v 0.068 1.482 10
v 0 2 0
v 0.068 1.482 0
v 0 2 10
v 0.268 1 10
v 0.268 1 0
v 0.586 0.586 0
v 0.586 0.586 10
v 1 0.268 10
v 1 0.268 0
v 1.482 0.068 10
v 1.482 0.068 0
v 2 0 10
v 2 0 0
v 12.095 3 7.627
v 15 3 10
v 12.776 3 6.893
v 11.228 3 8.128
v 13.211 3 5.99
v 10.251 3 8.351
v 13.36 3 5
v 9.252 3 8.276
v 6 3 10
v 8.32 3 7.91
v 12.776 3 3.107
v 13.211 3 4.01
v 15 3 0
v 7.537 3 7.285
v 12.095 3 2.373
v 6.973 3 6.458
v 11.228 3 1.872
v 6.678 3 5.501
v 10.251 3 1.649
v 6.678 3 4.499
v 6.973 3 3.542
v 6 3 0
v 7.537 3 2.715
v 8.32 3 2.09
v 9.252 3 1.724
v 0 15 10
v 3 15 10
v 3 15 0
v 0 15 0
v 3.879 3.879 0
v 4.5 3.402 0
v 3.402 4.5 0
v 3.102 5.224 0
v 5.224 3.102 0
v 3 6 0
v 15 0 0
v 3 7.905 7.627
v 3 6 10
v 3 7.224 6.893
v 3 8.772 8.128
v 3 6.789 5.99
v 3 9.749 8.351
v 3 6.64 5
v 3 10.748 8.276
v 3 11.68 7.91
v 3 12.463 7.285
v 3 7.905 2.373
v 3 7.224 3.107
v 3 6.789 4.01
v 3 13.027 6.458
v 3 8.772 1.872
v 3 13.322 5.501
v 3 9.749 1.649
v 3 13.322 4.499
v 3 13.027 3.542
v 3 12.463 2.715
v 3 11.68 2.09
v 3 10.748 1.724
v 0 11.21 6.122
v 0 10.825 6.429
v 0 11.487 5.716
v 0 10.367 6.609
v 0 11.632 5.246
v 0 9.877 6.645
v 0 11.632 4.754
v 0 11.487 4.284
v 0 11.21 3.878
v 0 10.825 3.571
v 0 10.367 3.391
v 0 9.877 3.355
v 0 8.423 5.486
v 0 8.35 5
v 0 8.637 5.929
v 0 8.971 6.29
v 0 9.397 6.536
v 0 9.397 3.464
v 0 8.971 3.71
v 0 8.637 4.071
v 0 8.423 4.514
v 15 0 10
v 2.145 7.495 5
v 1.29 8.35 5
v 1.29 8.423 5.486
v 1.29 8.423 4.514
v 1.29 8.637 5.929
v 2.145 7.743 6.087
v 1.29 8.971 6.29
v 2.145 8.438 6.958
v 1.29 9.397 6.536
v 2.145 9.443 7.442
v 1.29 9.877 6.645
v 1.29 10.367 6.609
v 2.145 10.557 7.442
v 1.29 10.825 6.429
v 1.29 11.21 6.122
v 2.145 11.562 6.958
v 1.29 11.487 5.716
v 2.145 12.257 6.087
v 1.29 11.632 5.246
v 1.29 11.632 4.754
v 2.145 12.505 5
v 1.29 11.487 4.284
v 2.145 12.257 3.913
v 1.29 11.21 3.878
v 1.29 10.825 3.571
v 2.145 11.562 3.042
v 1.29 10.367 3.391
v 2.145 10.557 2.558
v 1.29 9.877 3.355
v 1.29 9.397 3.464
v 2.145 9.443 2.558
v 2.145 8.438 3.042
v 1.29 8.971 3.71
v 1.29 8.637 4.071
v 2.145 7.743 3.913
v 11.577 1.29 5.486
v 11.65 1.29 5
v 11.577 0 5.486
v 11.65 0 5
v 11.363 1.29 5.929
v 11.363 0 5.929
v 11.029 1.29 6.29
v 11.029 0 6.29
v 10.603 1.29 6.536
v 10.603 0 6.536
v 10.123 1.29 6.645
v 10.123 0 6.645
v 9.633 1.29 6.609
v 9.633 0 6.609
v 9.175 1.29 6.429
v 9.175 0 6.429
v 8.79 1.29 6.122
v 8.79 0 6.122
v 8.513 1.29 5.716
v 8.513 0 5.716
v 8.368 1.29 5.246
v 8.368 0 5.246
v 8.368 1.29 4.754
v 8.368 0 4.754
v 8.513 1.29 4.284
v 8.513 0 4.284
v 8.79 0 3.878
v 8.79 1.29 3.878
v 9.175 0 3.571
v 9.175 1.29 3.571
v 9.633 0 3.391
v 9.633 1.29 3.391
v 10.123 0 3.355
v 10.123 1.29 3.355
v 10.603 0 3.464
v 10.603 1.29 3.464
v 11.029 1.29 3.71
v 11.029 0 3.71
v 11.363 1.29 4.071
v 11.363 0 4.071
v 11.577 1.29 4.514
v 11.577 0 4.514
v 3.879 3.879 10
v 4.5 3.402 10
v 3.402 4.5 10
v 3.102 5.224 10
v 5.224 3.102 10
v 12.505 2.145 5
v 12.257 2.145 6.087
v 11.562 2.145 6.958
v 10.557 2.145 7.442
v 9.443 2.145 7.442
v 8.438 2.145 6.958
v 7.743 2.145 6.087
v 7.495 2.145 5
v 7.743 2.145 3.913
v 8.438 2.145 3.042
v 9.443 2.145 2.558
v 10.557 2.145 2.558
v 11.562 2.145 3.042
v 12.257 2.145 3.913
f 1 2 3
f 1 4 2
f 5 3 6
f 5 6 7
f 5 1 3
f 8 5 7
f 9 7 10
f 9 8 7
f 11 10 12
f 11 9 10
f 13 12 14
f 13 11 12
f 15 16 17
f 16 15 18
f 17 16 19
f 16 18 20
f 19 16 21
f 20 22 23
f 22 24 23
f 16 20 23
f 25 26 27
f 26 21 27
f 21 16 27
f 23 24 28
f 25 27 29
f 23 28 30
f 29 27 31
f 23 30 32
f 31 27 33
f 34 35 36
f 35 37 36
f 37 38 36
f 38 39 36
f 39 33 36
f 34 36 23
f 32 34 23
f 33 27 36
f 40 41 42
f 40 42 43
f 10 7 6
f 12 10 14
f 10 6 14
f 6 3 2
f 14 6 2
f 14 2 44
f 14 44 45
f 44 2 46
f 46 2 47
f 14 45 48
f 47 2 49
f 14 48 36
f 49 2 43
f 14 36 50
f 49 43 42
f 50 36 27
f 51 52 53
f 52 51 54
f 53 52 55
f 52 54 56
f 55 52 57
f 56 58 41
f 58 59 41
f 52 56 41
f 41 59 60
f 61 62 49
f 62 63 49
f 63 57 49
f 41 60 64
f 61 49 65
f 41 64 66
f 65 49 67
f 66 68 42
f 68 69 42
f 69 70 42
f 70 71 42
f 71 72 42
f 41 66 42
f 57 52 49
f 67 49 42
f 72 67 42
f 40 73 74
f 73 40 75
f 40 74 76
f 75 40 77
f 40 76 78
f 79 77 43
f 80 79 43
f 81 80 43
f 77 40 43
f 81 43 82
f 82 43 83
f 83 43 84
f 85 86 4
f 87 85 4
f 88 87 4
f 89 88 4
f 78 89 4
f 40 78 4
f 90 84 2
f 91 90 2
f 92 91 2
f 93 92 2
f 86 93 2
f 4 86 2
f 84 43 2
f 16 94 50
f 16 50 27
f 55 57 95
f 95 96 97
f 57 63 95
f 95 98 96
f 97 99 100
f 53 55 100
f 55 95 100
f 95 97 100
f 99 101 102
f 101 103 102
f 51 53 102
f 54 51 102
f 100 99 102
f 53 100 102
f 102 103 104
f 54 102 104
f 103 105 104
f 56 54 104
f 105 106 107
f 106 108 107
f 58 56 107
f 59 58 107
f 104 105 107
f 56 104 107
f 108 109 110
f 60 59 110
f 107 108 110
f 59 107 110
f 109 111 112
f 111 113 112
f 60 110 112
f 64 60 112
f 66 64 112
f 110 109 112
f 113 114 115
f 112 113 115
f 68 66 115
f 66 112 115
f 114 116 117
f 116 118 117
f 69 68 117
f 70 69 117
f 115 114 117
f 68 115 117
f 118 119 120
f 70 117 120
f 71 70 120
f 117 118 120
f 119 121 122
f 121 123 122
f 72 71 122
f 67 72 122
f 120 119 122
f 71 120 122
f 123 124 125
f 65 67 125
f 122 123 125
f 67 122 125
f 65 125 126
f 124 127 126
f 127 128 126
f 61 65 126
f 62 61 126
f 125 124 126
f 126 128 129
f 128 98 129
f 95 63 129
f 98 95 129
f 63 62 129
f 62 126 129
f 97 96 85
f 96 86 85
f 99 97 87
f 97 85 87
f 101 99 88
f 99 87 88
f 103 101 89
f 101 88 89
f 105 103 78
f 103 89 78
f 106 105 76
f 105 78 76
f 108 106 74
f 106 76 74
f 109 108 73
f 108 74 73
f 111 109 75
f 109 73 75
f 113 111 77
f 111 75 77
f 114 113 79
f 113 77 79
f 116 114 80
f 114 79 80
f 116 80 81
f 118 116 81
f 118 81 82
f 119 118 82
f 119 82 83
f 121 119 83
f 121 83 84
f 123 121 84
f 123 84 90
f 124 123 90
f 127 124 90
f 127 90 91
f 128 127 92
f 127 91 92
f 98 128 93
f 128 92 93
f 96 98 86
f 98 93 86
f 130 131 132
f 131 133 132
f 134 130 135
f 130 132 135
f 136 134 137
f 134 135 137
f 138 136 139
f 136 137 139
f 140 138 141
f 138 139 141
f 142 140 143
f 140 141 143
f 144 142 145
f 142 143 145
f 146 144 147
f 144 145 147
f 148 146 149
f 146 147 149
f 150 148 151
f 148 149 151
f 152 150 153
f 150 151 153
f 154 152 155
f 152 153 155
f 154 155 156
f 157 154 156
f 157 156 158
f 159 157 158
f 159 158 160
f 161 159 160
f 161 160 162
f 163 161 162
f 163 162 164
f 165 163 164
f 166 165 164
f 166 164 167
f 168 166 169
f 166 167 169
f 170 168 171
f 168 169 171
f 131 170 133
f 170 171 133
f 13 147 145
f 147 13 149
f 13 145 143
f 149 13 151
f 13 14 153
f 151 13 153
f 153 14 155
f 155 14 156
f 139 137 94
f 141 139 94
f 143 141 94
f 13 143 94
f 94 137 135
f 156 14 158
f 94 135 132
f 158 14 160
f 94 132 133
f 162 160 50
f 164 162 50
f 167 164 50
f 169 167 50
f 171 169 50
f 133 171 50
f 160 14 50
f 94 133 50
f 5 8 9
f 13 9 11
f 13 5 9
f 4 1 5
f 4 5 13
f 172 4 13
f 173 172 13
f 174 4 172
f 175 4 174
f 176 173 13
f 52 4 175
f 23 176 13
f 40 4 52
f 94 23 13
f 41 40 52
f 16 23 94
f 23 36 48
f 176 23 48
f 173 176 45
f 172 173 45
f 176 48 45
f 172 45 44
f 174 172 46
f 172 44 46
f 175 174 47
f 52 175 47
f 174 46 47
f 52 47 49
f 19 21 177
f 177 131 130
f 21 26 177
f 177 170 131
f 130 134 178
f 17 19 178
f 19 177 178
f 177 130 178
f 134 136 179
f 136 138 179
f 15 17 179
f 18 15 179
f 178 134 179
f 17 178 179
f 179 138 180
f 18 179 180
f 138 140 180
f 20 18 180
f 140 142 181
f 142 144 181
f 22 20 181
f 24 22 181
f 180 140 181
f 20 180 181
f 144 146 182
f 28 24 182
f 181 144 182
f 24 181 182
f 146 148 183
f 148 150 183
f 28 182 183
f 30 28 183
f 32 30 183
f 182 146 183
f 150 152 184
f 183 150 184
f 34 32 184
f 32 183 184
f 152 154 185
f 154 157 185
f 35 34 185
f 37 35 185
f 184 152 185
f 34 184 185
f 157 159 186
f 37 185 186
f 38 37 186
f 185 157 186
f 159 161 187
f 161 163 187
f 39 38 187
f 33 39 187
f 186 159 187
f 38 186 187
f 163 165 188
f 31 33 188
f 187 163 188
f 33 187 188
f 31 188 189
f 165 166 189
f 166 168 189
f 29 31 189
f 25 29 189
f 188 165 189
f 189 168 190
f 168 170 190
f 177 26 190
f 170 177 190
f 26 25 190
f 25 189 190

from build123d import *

# Parameters (mm, degrees)
F1_DEPTH       = 10
F3_D           = 3.3
F3_CSINK_D     = 6.72
F3_CSINK_ANGLE = 90
F5_D           = 3.3
F5_CSINK_D     = 6.72
F5_CSINK_ANGLE = 90
F6_R           = 2


with BuildPart() as f1:
    # F0 (on Top) → F1 (new body)
    with BuildSketch(Plane.XY):
        with BuildLine():
            Line((0, 15), (0, 0))
            Line((0, 0), (15, 0))
            Line((15, 0), (15, 3))
            Line((15, 3), (6, 3))
            ThreePointArc((6, 3), (3.8786796564, 3.8786796564), (3, 6))
            Line((3, 6), (3, 15))
            Line((3, 15), (0, 15))
        make_face()
    extrude(amount=F1_DEPTH)

    # F3 (through all)
    with Locations(Plane.YZ.offset(3)):
        with Locations((10, 5)):
            CounterSinkHole(F3_D / 2, F3_CSINK_D / 2, counter_sink_angle=F3_CSINK_ANGLE)

    # F5 (through all)
    with Locations(Plane(origin=(0, 3, 0), x_dir=(-1, 0, 0), z_dir=(0, 1, 0))):
        with Locations((-10, 5)):
            CounterSinkHole(F5_D / 2, F5_CSINK_D / 2, counter_sink_angle=F5_CSINK_ANGLE)

    # F6
    f6_edges = [f1.edges().sort_by_distance(p)[0] for p in [
        (0, 0, 5),
    ]]
    fillet(f6_edges, radius=F6_R)


solid = f1.part
